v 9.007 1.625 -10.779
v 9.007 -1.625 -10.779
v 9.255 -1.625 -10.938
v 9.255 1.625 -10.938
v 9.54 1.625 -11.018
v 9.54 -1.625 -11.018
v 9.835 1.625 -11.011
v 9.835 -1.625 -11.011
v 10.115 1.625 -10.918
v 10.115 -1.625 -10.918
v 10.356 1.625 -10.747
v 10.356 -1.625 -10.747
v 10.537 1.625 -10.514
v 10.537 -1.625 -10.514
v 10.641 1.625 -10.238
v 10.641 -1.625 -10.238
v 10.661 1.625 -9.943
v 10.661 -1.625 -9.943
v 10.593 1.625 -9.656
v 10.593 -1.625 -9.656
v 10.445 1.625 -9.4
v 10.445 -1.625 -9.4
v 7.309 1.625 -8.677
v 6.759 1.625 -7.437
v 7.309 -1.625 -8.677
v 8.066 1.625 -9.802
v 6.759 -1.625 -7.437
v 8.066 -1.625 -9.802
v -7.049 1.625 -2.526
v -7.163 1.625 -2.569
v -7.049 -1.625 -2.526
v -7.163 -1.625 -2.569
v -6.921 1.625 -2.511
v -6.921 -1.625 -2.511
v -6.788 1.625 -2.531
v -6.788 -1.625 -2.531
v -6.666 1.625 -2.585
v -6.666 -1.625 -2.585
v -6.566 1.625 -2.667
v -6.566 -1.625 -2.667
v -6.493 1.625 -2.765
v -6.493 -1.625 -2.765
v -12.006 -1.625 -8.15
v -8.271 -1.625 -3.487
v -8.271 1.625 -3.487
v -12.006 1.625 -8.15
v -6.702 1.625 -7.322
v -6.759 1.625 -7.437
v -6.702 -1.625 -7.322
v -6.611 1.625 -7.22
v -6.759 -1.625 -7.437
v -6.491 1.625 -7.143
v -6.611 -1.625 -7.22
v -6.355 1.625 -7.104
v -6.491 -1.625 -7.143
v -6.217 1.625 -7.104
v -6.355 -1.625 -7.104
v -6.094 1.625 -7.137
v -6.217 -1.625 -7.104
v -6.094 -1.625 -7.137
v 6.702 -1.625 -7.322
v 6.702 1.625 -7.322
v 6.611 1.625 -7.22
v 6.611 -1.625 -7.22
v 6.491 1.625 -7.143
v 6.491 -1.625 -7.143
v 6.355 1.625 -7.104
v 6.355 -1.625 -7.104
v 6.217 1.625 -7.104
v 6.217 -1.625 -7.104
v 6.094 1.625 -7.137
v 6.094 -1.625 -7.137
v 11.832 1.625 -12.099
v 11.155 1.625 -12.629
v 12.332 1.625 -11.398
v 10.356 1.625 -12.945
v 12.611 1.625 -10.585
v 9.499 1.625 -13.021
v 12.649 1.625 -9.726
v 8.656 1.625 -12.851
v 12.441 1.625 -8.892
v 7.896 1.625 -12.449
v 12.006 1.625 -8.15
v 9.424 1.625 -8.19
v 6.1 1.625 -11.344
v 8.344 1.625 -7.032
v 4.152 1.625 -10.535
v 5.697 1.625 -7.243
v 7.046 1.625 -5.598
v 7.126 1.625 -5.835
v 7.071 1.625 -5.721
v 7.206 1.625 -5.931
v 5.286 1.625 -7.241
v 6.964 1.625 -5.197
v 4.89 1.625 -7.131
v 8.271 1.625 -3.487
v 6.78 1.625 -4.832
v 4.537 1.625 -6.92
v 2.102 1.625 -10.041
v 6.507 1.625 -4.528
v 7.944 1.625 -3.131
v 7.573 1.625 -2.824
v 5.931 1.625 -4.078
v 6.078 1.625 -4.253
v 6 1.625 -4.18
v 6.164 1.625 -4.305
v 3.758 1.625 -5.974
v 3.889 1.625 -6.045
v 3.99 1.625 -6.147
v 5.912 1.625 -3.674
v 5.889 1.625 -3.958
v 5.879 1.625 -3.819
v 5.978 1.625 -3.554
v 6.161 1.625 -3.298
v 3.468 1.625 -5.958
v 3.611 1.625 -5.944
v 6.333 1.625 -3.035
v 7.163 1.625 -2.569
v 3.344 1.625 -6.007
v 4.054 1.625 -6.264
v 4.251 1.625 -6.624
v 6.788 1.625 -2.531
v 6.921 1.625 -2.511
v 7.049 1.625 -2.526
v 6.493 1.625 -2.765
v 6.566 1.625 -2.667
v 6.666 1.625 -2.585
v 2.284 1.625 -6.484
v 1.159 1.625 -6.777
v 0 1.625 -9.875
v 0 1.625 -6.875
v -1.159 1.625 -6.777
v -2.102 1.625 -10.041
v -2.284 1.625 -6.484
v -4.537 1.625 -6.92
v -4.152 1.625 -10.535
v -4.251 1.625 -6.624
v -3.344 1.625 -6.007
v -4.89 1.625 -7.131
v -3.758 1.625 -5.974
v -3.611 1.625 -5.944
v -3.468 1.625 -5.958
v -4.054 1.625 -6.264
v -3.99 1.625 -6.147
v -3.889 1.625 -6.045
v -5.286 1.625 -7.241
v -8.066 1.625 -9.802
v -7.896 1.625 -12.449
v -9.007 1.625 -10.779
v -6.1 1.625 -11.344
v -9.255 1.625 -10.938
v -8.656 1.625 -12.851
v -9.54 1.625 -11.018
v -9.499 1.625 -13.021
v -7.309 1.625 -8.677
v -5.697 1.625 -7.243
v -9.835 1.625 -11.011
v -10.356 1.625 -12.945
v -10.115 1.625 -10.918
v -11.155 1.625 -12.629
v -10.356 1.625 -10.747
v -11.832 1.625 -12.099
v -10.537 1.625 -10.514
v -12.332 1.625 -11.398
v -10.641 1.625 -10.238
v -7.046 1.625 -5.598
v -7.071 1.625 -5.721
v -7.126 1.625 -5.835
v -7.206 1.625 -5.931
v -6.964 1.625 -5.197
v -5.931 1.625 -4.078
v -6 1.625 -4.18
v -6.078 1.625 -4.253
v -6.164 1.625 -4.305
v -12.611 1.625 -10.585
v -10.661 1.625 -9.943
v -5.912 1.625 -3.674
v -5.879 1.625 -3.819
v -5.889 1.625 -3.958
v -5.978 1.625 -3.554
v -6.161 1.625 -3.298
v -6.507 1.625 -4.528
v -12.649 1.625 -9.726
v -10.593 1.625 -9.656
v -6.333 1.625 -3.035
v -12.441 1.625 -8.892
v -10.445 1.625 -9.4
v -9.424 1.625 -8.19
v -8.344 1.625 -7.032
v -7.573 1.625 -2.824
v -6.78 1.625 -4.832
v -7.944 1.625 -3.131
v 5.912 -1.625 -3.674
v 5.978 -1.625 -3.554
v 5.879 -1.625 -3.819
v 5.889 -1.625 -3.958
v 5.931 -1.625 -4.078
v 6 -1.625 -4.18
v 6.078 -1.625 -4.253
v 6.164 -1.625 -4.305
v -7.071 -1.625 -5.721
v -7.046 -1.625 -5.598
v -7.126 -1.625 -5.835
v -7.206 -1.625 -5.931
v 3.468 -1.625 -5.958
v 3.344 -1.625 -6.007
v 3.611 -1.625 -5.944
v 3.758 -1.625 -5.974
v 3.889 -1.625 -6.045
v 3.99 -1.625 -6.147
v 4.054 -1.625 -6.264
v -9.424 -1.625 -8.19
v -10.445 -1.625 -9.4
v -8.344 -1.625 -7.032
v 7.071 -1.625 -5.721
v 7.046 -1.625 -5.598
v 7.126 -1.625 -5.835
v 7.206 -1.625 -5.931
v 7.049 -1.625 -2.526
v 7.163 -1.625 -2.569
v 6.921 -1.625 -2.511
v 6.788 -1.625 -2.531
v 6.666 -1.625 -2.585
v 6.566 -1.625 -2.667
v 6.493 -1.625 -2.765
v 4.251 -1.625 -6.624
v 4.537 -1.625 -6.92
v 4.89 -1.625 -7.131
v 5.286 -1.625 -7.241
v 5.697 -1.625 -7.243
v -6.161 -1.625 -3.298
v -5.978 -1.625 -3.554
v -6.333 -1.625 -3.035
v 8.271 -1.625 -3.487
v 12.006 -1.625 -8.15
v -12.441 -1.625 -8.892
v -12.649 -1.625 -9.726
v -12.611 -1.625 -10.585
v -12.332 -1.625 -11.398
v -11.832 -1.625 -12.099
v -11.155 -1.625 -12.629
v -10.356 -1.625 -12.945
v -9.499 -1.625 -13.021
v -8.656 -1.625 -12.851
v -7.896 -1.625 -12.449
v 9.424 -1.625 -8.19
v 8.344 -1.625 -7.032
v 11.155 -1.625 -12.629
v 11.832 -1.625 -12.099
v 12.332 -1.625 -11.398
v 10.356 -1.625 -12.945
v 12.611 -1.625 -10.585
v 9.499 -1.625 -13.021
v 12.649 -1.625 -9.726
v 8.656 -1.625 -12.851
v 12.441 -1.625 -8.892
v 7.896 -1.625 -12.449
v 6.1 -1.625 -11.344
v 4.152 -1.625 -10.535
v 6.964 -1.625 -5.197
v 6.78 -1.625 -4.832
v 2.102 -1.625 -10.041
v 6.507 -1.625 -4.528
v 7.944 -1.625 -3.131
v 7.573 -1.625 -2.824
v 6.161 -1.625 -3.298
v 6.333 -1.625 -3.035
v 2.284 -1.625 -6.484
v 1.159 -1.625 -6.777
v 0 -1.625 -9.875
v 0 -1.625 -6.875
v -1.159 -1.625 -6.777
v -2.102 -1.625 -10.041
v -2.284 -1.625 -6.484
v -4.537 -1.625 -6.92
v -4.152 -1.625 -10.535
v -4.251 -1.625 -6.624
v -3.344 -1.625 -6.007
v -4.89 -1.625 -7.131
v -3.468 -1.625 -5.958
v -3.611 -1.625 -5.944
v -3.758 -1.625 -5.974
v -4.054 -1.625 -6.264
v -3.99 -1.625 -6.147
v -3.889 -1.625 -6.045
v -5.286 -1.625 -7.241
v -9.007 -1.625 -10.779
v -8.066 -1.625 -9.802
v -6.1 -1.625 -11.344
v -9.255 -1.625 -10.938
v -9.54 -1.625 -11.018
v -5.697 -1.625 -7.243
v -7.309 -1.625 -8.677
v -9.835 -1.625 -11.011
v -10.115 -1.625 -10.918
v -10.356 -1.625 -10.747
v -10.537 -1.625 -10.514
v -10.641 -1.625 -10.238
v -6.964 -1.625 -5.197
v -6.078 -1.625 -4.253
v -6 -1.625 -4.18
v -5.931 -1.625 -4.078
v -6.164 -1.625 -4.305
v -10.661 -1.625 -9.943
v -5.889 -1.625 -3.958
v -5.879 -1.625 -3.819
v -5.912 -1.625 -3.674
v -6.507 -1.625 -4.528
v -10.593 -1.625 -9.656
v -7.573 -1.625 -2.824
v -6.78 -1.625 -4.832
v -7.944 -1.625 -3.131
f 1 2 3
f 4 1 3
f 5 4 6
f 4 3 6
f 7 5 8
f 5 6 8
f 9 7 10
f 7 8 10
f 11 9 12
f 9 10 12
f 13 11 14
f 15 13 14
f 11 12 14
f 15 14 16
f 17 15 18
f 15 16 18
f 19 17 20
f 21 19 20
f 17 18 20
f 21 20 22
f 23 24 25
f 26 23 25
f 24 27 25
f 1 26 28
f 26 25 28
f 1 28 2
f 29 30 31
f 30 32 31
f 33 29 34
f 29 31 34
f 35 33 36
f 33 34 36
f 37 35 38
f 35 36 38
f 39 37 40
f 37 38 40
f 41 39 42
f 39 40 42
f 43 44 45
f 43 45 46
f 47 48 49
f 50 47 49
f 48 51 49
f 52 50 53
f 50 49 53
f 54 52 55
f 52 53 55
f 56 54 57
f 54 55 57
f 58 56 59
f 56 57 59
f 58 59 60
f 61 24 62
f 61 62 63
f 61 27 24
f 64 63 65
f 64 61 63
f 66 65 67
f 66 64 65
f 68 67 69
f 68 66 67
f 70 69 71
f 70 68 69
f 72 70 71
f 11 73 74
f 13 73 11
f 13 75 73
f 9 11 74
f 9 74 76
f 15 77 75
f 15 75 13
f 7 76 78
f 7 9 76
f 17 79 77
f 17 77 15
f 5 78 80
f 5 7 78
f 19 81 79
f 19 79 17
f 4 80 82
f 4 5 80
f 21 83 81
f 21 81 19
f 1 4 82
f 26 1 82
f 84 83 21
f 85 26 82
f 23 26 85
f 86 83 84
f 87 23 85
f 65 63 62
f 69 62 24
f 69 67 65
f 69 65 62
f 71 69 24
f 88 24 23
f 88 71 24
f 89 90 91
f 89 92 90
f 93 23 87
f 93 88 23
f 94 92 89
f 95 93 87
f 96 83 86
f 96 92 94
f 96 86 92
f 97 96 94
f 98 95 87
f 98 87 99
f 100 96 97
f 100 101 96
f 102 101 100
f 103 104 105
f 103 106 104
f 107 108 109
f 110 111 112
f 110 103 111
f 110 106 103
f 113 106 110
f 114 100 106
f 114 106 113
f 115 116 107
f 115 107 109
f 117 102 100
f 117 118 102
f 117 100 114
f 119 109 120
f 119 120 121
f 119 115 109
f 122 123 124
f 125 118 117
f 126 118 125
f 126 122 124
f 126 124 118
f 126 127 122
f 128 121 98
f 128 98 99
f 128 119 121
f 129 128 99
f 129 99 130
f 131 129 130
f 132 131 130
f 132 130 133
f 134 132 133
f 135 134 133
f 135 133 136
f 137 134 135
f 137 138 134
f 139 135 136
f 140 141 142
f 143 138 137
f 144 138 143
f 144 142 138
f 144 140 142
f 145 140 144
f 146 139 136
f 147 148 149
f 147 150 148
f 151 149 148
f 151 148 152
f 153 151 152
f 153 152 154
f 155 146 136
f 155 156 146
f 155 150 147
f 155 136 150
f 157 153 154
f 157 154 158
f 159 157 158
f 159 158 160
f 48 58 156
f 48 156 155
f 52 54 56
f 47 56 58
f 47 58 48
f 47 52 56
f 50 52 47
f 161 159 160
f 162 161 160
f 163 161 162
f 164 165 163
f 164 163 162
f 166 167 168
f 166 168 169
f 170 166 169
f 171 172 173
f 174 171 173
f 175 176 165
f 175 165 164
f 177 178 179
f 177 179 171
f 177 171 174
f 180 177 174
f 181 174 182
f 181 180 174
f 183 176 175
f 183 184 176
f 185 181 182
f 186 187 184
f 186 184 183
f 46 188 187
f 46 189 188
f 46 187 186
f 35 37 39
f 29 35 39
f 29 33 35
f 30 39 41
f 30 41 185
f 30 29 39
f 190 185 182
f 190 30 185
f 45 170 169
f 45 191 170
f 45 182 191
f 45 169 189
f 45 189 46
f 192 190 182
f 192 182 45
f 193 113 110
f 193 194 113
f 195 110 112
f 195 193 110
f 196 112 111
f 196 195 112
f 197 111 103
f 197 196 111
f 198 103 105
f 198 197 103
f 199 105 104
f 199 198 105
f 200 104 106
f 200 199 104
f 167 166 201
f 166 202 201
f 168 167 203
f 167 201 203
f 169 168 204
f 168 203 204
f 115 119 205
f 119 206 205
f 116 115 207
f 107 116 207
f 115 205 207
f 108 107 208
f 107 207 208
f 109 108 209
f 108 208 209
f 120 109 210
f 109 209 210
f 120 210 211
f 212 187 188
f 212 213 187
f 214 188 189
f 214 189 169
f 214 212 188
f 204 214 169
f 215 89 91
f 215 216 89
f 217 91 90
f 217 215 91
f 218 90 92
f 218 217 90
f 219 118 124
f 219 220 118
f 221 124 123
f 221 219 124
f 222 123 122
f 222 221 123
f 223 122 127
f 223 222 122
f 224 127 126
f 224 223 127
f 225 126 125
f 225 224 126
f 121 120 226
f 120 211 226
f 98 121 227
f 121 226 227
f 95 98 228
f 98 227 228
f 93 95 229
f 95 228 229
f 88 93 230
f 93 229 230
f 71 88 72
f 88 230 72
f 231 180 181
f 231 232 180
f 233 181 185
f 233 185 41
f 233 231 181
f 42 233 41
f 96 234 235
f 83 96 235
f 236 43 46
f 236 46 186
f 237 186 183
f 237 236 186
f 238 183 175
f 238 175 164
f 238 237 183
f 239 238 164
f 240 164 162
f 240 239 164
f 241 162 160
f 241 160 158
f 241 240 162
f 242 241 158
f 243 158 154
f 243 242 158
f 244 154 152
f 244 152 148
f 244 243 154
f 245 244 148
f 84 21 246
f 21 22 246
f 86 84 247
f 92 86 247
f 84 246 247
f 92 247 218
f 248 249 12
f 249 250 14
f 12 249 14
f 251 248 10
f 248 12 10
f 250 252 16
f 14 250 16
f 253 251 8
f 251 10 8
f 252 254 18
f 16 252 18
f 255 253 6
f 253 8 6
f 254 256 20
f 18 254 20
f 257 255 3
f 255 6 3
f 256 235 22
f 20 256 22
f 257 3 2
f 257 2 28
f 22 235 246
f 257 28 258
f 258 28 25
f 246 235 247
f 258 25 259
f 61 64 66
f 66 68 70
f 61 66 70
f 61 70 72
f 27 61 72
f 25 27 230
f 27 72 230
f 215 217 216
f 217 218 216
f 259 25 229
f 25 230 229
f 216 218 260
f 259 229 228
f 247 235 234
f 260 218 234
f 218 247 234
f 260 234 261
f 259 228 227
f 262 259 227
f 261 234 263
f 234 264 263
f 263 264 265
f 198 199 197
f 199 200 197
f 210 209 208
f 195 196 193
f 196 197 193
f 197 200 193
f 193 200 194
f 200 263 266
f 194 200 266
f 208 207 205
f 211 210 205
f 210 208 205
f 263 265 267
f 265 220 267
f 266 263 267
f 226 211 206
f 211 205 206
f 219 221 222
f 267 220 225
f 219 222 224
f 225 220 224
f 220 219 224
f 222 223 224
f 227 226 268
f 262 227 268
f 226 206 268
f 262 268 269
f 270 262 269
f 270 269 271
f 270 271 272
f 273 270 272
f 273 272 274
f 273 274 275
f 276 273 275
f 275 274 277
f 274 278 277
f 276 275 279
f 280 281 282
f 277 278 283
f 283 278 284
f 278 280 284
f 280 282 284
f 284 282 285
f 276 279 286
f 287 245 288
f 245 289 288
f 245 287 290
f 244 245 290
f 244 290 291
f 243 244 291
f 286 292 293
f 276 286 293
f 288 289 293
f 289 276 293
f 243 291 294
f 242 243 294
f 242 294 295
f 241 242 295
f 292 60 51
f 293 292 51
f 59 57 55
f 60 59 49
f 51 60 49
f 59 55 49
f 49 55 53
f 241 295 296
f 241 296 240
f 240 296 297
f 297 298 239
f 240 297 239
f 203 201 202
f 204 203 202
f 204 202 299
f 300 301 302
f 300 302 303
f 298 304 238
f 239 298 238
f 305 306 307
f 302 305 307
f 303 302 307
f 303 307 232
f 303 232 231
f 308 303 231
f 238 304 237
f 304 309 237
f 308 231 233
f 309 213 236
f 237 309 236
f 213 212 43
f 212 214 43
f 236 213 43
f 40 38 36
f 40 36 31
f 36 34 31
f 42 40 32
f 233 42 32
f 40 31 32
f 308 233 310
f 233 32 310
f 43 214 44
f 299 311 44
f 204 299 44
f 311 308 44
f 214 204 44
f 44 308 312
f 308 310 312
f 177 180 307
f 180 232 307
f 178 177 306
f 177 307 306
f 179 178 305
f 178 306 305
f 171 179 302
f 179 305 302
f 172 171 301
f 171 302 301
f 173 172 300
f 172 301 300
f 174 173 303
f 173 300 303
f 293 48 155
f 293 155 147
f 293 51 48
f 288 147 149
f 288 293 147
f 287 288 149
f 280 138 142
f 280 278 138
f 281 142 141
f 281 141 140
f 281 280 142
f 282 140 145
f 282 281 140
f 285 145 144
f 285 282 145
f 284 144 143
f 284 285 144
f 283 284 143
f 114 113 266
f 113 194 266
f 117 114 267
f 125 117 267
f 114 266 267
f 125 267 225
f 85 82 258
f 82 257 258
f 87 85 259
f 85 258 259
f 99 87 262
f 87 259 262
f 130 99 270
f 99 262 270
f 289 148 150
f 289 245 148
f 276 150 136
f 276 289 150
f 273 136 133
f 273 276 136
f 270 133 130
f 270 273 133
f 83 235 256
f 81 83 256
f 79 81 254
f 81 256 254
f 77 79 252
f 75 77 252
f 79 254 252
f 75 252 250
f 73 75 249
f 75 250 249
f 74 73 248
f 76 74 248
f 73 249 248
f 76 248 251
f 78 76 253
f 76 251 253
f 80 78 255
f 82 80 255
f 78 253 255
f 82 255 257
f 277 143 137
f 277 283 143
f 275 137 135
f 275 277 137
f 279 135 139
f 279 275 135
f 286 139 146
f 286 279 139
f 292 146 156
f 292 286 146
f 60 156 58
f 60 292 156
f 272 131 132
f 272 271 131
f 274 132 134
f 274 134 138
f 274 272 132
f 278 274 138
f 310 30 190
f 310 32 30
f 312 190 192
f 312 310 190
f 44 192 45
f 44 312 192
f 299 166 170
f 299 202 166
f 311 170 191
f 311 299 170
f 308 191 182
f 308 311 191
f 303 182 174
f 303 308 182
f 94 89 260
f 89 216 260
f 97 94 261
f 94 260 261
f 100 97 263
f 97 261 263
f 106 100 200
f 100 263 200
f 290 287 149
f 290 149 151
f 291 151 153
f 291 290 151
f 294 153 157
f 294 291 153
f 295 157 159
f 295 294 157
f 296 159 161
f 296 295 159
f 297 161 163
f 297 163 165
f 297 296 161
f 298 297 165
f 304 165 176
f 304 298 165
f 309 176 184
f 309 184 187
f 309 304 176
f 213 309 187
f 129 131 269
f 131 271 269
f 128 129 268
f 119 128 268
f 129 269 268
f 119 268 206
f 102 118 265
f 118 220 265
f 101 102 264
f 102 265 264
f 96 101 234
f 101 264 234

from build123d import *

# Parameters (mm, degrees)
F2_DEPTH = 1.625
F3_R     = 0.5


with BuildPart() as f2:
    # F1 (on Front) → F2 (new body, symmetric)
    with BuildSketch(Plane.XZ):
        with BuildLine():
            ThreePointArc((0, -6.875), (-2.0724417463, -6.5551971906), (-3.9520768911, -5.6255411515))
            ThreePointArc((-3.9520768911, -5.6255411515), (-4.8570002775, -7.1160909953), (-6.5757097792, -6.8217054979))
            ThreePointArc((-6.5757097792, -6.8217054979), (-7.4894639741, -8.9857797177), (-9.0066893746, -10.7791539234))
            ThreePointArc((-9.0066893746, -10.7791539234), (-10.3561219729, -10.7473840389), (-10.4445927673, -9.400479966))
            ThreePointArc((-10.4445927673, -9.400479966), (-8.8177667586, -7.5260240462), (-7.0479231089, -5.7859661986))
            ThreePointArc((-7.0479231089, -5.7859661986), (-6.6159518229, -4.6300438958), (-5.4766665535, -4.1559293139))
            ThreePointArc((-5.4766665535, -4.1559293139), (-6.1554446566, -3.3057655277), (-6.7033968415, -2.3659428957))
            ThreePointArc((-6.7033968415, -2.3659428957), (-7.5646836603, -2.8179203379), (-8.2709699391, -3.4866940551))
            Line((-8.2709699391, -3.4866940551), (-12.0057025921, -8.1503055323))
            ThreePointArc((-12.0057025921, -8.1503055323), (-11.8324993376, -12.098674705), (-7.8959026306, -12.4491384793))
            ThreePointArc((-7.8959026306, -12.4491384793), (-4.1524531082, -10.534781214), (0, -9.875))
            Line((0, -9.875), (0, -6.875))
        make_face()
    extrude(amount=F2_DEPTH, both=True)

    # F3
    f3_edges = [f2.edges().sort_by_distance(p)[0] for p in [
        (-3.952077, 0, -5.625541),
        (-7.047923, 0, -5.785966),
        (-6.703397, 0, -2.365943),
        (-5.476667, 0, -4.155929),
        (-6.57571, 0, -6.821705),
    ]]
    fillet(f3_edges, radius=F3_R)

    # F4: F2 across plane


with BuildPart() as f2_1:
    add(f2.part)
    add(f2.part.mirror(Plane.YZ))


solid = f2_1.part
